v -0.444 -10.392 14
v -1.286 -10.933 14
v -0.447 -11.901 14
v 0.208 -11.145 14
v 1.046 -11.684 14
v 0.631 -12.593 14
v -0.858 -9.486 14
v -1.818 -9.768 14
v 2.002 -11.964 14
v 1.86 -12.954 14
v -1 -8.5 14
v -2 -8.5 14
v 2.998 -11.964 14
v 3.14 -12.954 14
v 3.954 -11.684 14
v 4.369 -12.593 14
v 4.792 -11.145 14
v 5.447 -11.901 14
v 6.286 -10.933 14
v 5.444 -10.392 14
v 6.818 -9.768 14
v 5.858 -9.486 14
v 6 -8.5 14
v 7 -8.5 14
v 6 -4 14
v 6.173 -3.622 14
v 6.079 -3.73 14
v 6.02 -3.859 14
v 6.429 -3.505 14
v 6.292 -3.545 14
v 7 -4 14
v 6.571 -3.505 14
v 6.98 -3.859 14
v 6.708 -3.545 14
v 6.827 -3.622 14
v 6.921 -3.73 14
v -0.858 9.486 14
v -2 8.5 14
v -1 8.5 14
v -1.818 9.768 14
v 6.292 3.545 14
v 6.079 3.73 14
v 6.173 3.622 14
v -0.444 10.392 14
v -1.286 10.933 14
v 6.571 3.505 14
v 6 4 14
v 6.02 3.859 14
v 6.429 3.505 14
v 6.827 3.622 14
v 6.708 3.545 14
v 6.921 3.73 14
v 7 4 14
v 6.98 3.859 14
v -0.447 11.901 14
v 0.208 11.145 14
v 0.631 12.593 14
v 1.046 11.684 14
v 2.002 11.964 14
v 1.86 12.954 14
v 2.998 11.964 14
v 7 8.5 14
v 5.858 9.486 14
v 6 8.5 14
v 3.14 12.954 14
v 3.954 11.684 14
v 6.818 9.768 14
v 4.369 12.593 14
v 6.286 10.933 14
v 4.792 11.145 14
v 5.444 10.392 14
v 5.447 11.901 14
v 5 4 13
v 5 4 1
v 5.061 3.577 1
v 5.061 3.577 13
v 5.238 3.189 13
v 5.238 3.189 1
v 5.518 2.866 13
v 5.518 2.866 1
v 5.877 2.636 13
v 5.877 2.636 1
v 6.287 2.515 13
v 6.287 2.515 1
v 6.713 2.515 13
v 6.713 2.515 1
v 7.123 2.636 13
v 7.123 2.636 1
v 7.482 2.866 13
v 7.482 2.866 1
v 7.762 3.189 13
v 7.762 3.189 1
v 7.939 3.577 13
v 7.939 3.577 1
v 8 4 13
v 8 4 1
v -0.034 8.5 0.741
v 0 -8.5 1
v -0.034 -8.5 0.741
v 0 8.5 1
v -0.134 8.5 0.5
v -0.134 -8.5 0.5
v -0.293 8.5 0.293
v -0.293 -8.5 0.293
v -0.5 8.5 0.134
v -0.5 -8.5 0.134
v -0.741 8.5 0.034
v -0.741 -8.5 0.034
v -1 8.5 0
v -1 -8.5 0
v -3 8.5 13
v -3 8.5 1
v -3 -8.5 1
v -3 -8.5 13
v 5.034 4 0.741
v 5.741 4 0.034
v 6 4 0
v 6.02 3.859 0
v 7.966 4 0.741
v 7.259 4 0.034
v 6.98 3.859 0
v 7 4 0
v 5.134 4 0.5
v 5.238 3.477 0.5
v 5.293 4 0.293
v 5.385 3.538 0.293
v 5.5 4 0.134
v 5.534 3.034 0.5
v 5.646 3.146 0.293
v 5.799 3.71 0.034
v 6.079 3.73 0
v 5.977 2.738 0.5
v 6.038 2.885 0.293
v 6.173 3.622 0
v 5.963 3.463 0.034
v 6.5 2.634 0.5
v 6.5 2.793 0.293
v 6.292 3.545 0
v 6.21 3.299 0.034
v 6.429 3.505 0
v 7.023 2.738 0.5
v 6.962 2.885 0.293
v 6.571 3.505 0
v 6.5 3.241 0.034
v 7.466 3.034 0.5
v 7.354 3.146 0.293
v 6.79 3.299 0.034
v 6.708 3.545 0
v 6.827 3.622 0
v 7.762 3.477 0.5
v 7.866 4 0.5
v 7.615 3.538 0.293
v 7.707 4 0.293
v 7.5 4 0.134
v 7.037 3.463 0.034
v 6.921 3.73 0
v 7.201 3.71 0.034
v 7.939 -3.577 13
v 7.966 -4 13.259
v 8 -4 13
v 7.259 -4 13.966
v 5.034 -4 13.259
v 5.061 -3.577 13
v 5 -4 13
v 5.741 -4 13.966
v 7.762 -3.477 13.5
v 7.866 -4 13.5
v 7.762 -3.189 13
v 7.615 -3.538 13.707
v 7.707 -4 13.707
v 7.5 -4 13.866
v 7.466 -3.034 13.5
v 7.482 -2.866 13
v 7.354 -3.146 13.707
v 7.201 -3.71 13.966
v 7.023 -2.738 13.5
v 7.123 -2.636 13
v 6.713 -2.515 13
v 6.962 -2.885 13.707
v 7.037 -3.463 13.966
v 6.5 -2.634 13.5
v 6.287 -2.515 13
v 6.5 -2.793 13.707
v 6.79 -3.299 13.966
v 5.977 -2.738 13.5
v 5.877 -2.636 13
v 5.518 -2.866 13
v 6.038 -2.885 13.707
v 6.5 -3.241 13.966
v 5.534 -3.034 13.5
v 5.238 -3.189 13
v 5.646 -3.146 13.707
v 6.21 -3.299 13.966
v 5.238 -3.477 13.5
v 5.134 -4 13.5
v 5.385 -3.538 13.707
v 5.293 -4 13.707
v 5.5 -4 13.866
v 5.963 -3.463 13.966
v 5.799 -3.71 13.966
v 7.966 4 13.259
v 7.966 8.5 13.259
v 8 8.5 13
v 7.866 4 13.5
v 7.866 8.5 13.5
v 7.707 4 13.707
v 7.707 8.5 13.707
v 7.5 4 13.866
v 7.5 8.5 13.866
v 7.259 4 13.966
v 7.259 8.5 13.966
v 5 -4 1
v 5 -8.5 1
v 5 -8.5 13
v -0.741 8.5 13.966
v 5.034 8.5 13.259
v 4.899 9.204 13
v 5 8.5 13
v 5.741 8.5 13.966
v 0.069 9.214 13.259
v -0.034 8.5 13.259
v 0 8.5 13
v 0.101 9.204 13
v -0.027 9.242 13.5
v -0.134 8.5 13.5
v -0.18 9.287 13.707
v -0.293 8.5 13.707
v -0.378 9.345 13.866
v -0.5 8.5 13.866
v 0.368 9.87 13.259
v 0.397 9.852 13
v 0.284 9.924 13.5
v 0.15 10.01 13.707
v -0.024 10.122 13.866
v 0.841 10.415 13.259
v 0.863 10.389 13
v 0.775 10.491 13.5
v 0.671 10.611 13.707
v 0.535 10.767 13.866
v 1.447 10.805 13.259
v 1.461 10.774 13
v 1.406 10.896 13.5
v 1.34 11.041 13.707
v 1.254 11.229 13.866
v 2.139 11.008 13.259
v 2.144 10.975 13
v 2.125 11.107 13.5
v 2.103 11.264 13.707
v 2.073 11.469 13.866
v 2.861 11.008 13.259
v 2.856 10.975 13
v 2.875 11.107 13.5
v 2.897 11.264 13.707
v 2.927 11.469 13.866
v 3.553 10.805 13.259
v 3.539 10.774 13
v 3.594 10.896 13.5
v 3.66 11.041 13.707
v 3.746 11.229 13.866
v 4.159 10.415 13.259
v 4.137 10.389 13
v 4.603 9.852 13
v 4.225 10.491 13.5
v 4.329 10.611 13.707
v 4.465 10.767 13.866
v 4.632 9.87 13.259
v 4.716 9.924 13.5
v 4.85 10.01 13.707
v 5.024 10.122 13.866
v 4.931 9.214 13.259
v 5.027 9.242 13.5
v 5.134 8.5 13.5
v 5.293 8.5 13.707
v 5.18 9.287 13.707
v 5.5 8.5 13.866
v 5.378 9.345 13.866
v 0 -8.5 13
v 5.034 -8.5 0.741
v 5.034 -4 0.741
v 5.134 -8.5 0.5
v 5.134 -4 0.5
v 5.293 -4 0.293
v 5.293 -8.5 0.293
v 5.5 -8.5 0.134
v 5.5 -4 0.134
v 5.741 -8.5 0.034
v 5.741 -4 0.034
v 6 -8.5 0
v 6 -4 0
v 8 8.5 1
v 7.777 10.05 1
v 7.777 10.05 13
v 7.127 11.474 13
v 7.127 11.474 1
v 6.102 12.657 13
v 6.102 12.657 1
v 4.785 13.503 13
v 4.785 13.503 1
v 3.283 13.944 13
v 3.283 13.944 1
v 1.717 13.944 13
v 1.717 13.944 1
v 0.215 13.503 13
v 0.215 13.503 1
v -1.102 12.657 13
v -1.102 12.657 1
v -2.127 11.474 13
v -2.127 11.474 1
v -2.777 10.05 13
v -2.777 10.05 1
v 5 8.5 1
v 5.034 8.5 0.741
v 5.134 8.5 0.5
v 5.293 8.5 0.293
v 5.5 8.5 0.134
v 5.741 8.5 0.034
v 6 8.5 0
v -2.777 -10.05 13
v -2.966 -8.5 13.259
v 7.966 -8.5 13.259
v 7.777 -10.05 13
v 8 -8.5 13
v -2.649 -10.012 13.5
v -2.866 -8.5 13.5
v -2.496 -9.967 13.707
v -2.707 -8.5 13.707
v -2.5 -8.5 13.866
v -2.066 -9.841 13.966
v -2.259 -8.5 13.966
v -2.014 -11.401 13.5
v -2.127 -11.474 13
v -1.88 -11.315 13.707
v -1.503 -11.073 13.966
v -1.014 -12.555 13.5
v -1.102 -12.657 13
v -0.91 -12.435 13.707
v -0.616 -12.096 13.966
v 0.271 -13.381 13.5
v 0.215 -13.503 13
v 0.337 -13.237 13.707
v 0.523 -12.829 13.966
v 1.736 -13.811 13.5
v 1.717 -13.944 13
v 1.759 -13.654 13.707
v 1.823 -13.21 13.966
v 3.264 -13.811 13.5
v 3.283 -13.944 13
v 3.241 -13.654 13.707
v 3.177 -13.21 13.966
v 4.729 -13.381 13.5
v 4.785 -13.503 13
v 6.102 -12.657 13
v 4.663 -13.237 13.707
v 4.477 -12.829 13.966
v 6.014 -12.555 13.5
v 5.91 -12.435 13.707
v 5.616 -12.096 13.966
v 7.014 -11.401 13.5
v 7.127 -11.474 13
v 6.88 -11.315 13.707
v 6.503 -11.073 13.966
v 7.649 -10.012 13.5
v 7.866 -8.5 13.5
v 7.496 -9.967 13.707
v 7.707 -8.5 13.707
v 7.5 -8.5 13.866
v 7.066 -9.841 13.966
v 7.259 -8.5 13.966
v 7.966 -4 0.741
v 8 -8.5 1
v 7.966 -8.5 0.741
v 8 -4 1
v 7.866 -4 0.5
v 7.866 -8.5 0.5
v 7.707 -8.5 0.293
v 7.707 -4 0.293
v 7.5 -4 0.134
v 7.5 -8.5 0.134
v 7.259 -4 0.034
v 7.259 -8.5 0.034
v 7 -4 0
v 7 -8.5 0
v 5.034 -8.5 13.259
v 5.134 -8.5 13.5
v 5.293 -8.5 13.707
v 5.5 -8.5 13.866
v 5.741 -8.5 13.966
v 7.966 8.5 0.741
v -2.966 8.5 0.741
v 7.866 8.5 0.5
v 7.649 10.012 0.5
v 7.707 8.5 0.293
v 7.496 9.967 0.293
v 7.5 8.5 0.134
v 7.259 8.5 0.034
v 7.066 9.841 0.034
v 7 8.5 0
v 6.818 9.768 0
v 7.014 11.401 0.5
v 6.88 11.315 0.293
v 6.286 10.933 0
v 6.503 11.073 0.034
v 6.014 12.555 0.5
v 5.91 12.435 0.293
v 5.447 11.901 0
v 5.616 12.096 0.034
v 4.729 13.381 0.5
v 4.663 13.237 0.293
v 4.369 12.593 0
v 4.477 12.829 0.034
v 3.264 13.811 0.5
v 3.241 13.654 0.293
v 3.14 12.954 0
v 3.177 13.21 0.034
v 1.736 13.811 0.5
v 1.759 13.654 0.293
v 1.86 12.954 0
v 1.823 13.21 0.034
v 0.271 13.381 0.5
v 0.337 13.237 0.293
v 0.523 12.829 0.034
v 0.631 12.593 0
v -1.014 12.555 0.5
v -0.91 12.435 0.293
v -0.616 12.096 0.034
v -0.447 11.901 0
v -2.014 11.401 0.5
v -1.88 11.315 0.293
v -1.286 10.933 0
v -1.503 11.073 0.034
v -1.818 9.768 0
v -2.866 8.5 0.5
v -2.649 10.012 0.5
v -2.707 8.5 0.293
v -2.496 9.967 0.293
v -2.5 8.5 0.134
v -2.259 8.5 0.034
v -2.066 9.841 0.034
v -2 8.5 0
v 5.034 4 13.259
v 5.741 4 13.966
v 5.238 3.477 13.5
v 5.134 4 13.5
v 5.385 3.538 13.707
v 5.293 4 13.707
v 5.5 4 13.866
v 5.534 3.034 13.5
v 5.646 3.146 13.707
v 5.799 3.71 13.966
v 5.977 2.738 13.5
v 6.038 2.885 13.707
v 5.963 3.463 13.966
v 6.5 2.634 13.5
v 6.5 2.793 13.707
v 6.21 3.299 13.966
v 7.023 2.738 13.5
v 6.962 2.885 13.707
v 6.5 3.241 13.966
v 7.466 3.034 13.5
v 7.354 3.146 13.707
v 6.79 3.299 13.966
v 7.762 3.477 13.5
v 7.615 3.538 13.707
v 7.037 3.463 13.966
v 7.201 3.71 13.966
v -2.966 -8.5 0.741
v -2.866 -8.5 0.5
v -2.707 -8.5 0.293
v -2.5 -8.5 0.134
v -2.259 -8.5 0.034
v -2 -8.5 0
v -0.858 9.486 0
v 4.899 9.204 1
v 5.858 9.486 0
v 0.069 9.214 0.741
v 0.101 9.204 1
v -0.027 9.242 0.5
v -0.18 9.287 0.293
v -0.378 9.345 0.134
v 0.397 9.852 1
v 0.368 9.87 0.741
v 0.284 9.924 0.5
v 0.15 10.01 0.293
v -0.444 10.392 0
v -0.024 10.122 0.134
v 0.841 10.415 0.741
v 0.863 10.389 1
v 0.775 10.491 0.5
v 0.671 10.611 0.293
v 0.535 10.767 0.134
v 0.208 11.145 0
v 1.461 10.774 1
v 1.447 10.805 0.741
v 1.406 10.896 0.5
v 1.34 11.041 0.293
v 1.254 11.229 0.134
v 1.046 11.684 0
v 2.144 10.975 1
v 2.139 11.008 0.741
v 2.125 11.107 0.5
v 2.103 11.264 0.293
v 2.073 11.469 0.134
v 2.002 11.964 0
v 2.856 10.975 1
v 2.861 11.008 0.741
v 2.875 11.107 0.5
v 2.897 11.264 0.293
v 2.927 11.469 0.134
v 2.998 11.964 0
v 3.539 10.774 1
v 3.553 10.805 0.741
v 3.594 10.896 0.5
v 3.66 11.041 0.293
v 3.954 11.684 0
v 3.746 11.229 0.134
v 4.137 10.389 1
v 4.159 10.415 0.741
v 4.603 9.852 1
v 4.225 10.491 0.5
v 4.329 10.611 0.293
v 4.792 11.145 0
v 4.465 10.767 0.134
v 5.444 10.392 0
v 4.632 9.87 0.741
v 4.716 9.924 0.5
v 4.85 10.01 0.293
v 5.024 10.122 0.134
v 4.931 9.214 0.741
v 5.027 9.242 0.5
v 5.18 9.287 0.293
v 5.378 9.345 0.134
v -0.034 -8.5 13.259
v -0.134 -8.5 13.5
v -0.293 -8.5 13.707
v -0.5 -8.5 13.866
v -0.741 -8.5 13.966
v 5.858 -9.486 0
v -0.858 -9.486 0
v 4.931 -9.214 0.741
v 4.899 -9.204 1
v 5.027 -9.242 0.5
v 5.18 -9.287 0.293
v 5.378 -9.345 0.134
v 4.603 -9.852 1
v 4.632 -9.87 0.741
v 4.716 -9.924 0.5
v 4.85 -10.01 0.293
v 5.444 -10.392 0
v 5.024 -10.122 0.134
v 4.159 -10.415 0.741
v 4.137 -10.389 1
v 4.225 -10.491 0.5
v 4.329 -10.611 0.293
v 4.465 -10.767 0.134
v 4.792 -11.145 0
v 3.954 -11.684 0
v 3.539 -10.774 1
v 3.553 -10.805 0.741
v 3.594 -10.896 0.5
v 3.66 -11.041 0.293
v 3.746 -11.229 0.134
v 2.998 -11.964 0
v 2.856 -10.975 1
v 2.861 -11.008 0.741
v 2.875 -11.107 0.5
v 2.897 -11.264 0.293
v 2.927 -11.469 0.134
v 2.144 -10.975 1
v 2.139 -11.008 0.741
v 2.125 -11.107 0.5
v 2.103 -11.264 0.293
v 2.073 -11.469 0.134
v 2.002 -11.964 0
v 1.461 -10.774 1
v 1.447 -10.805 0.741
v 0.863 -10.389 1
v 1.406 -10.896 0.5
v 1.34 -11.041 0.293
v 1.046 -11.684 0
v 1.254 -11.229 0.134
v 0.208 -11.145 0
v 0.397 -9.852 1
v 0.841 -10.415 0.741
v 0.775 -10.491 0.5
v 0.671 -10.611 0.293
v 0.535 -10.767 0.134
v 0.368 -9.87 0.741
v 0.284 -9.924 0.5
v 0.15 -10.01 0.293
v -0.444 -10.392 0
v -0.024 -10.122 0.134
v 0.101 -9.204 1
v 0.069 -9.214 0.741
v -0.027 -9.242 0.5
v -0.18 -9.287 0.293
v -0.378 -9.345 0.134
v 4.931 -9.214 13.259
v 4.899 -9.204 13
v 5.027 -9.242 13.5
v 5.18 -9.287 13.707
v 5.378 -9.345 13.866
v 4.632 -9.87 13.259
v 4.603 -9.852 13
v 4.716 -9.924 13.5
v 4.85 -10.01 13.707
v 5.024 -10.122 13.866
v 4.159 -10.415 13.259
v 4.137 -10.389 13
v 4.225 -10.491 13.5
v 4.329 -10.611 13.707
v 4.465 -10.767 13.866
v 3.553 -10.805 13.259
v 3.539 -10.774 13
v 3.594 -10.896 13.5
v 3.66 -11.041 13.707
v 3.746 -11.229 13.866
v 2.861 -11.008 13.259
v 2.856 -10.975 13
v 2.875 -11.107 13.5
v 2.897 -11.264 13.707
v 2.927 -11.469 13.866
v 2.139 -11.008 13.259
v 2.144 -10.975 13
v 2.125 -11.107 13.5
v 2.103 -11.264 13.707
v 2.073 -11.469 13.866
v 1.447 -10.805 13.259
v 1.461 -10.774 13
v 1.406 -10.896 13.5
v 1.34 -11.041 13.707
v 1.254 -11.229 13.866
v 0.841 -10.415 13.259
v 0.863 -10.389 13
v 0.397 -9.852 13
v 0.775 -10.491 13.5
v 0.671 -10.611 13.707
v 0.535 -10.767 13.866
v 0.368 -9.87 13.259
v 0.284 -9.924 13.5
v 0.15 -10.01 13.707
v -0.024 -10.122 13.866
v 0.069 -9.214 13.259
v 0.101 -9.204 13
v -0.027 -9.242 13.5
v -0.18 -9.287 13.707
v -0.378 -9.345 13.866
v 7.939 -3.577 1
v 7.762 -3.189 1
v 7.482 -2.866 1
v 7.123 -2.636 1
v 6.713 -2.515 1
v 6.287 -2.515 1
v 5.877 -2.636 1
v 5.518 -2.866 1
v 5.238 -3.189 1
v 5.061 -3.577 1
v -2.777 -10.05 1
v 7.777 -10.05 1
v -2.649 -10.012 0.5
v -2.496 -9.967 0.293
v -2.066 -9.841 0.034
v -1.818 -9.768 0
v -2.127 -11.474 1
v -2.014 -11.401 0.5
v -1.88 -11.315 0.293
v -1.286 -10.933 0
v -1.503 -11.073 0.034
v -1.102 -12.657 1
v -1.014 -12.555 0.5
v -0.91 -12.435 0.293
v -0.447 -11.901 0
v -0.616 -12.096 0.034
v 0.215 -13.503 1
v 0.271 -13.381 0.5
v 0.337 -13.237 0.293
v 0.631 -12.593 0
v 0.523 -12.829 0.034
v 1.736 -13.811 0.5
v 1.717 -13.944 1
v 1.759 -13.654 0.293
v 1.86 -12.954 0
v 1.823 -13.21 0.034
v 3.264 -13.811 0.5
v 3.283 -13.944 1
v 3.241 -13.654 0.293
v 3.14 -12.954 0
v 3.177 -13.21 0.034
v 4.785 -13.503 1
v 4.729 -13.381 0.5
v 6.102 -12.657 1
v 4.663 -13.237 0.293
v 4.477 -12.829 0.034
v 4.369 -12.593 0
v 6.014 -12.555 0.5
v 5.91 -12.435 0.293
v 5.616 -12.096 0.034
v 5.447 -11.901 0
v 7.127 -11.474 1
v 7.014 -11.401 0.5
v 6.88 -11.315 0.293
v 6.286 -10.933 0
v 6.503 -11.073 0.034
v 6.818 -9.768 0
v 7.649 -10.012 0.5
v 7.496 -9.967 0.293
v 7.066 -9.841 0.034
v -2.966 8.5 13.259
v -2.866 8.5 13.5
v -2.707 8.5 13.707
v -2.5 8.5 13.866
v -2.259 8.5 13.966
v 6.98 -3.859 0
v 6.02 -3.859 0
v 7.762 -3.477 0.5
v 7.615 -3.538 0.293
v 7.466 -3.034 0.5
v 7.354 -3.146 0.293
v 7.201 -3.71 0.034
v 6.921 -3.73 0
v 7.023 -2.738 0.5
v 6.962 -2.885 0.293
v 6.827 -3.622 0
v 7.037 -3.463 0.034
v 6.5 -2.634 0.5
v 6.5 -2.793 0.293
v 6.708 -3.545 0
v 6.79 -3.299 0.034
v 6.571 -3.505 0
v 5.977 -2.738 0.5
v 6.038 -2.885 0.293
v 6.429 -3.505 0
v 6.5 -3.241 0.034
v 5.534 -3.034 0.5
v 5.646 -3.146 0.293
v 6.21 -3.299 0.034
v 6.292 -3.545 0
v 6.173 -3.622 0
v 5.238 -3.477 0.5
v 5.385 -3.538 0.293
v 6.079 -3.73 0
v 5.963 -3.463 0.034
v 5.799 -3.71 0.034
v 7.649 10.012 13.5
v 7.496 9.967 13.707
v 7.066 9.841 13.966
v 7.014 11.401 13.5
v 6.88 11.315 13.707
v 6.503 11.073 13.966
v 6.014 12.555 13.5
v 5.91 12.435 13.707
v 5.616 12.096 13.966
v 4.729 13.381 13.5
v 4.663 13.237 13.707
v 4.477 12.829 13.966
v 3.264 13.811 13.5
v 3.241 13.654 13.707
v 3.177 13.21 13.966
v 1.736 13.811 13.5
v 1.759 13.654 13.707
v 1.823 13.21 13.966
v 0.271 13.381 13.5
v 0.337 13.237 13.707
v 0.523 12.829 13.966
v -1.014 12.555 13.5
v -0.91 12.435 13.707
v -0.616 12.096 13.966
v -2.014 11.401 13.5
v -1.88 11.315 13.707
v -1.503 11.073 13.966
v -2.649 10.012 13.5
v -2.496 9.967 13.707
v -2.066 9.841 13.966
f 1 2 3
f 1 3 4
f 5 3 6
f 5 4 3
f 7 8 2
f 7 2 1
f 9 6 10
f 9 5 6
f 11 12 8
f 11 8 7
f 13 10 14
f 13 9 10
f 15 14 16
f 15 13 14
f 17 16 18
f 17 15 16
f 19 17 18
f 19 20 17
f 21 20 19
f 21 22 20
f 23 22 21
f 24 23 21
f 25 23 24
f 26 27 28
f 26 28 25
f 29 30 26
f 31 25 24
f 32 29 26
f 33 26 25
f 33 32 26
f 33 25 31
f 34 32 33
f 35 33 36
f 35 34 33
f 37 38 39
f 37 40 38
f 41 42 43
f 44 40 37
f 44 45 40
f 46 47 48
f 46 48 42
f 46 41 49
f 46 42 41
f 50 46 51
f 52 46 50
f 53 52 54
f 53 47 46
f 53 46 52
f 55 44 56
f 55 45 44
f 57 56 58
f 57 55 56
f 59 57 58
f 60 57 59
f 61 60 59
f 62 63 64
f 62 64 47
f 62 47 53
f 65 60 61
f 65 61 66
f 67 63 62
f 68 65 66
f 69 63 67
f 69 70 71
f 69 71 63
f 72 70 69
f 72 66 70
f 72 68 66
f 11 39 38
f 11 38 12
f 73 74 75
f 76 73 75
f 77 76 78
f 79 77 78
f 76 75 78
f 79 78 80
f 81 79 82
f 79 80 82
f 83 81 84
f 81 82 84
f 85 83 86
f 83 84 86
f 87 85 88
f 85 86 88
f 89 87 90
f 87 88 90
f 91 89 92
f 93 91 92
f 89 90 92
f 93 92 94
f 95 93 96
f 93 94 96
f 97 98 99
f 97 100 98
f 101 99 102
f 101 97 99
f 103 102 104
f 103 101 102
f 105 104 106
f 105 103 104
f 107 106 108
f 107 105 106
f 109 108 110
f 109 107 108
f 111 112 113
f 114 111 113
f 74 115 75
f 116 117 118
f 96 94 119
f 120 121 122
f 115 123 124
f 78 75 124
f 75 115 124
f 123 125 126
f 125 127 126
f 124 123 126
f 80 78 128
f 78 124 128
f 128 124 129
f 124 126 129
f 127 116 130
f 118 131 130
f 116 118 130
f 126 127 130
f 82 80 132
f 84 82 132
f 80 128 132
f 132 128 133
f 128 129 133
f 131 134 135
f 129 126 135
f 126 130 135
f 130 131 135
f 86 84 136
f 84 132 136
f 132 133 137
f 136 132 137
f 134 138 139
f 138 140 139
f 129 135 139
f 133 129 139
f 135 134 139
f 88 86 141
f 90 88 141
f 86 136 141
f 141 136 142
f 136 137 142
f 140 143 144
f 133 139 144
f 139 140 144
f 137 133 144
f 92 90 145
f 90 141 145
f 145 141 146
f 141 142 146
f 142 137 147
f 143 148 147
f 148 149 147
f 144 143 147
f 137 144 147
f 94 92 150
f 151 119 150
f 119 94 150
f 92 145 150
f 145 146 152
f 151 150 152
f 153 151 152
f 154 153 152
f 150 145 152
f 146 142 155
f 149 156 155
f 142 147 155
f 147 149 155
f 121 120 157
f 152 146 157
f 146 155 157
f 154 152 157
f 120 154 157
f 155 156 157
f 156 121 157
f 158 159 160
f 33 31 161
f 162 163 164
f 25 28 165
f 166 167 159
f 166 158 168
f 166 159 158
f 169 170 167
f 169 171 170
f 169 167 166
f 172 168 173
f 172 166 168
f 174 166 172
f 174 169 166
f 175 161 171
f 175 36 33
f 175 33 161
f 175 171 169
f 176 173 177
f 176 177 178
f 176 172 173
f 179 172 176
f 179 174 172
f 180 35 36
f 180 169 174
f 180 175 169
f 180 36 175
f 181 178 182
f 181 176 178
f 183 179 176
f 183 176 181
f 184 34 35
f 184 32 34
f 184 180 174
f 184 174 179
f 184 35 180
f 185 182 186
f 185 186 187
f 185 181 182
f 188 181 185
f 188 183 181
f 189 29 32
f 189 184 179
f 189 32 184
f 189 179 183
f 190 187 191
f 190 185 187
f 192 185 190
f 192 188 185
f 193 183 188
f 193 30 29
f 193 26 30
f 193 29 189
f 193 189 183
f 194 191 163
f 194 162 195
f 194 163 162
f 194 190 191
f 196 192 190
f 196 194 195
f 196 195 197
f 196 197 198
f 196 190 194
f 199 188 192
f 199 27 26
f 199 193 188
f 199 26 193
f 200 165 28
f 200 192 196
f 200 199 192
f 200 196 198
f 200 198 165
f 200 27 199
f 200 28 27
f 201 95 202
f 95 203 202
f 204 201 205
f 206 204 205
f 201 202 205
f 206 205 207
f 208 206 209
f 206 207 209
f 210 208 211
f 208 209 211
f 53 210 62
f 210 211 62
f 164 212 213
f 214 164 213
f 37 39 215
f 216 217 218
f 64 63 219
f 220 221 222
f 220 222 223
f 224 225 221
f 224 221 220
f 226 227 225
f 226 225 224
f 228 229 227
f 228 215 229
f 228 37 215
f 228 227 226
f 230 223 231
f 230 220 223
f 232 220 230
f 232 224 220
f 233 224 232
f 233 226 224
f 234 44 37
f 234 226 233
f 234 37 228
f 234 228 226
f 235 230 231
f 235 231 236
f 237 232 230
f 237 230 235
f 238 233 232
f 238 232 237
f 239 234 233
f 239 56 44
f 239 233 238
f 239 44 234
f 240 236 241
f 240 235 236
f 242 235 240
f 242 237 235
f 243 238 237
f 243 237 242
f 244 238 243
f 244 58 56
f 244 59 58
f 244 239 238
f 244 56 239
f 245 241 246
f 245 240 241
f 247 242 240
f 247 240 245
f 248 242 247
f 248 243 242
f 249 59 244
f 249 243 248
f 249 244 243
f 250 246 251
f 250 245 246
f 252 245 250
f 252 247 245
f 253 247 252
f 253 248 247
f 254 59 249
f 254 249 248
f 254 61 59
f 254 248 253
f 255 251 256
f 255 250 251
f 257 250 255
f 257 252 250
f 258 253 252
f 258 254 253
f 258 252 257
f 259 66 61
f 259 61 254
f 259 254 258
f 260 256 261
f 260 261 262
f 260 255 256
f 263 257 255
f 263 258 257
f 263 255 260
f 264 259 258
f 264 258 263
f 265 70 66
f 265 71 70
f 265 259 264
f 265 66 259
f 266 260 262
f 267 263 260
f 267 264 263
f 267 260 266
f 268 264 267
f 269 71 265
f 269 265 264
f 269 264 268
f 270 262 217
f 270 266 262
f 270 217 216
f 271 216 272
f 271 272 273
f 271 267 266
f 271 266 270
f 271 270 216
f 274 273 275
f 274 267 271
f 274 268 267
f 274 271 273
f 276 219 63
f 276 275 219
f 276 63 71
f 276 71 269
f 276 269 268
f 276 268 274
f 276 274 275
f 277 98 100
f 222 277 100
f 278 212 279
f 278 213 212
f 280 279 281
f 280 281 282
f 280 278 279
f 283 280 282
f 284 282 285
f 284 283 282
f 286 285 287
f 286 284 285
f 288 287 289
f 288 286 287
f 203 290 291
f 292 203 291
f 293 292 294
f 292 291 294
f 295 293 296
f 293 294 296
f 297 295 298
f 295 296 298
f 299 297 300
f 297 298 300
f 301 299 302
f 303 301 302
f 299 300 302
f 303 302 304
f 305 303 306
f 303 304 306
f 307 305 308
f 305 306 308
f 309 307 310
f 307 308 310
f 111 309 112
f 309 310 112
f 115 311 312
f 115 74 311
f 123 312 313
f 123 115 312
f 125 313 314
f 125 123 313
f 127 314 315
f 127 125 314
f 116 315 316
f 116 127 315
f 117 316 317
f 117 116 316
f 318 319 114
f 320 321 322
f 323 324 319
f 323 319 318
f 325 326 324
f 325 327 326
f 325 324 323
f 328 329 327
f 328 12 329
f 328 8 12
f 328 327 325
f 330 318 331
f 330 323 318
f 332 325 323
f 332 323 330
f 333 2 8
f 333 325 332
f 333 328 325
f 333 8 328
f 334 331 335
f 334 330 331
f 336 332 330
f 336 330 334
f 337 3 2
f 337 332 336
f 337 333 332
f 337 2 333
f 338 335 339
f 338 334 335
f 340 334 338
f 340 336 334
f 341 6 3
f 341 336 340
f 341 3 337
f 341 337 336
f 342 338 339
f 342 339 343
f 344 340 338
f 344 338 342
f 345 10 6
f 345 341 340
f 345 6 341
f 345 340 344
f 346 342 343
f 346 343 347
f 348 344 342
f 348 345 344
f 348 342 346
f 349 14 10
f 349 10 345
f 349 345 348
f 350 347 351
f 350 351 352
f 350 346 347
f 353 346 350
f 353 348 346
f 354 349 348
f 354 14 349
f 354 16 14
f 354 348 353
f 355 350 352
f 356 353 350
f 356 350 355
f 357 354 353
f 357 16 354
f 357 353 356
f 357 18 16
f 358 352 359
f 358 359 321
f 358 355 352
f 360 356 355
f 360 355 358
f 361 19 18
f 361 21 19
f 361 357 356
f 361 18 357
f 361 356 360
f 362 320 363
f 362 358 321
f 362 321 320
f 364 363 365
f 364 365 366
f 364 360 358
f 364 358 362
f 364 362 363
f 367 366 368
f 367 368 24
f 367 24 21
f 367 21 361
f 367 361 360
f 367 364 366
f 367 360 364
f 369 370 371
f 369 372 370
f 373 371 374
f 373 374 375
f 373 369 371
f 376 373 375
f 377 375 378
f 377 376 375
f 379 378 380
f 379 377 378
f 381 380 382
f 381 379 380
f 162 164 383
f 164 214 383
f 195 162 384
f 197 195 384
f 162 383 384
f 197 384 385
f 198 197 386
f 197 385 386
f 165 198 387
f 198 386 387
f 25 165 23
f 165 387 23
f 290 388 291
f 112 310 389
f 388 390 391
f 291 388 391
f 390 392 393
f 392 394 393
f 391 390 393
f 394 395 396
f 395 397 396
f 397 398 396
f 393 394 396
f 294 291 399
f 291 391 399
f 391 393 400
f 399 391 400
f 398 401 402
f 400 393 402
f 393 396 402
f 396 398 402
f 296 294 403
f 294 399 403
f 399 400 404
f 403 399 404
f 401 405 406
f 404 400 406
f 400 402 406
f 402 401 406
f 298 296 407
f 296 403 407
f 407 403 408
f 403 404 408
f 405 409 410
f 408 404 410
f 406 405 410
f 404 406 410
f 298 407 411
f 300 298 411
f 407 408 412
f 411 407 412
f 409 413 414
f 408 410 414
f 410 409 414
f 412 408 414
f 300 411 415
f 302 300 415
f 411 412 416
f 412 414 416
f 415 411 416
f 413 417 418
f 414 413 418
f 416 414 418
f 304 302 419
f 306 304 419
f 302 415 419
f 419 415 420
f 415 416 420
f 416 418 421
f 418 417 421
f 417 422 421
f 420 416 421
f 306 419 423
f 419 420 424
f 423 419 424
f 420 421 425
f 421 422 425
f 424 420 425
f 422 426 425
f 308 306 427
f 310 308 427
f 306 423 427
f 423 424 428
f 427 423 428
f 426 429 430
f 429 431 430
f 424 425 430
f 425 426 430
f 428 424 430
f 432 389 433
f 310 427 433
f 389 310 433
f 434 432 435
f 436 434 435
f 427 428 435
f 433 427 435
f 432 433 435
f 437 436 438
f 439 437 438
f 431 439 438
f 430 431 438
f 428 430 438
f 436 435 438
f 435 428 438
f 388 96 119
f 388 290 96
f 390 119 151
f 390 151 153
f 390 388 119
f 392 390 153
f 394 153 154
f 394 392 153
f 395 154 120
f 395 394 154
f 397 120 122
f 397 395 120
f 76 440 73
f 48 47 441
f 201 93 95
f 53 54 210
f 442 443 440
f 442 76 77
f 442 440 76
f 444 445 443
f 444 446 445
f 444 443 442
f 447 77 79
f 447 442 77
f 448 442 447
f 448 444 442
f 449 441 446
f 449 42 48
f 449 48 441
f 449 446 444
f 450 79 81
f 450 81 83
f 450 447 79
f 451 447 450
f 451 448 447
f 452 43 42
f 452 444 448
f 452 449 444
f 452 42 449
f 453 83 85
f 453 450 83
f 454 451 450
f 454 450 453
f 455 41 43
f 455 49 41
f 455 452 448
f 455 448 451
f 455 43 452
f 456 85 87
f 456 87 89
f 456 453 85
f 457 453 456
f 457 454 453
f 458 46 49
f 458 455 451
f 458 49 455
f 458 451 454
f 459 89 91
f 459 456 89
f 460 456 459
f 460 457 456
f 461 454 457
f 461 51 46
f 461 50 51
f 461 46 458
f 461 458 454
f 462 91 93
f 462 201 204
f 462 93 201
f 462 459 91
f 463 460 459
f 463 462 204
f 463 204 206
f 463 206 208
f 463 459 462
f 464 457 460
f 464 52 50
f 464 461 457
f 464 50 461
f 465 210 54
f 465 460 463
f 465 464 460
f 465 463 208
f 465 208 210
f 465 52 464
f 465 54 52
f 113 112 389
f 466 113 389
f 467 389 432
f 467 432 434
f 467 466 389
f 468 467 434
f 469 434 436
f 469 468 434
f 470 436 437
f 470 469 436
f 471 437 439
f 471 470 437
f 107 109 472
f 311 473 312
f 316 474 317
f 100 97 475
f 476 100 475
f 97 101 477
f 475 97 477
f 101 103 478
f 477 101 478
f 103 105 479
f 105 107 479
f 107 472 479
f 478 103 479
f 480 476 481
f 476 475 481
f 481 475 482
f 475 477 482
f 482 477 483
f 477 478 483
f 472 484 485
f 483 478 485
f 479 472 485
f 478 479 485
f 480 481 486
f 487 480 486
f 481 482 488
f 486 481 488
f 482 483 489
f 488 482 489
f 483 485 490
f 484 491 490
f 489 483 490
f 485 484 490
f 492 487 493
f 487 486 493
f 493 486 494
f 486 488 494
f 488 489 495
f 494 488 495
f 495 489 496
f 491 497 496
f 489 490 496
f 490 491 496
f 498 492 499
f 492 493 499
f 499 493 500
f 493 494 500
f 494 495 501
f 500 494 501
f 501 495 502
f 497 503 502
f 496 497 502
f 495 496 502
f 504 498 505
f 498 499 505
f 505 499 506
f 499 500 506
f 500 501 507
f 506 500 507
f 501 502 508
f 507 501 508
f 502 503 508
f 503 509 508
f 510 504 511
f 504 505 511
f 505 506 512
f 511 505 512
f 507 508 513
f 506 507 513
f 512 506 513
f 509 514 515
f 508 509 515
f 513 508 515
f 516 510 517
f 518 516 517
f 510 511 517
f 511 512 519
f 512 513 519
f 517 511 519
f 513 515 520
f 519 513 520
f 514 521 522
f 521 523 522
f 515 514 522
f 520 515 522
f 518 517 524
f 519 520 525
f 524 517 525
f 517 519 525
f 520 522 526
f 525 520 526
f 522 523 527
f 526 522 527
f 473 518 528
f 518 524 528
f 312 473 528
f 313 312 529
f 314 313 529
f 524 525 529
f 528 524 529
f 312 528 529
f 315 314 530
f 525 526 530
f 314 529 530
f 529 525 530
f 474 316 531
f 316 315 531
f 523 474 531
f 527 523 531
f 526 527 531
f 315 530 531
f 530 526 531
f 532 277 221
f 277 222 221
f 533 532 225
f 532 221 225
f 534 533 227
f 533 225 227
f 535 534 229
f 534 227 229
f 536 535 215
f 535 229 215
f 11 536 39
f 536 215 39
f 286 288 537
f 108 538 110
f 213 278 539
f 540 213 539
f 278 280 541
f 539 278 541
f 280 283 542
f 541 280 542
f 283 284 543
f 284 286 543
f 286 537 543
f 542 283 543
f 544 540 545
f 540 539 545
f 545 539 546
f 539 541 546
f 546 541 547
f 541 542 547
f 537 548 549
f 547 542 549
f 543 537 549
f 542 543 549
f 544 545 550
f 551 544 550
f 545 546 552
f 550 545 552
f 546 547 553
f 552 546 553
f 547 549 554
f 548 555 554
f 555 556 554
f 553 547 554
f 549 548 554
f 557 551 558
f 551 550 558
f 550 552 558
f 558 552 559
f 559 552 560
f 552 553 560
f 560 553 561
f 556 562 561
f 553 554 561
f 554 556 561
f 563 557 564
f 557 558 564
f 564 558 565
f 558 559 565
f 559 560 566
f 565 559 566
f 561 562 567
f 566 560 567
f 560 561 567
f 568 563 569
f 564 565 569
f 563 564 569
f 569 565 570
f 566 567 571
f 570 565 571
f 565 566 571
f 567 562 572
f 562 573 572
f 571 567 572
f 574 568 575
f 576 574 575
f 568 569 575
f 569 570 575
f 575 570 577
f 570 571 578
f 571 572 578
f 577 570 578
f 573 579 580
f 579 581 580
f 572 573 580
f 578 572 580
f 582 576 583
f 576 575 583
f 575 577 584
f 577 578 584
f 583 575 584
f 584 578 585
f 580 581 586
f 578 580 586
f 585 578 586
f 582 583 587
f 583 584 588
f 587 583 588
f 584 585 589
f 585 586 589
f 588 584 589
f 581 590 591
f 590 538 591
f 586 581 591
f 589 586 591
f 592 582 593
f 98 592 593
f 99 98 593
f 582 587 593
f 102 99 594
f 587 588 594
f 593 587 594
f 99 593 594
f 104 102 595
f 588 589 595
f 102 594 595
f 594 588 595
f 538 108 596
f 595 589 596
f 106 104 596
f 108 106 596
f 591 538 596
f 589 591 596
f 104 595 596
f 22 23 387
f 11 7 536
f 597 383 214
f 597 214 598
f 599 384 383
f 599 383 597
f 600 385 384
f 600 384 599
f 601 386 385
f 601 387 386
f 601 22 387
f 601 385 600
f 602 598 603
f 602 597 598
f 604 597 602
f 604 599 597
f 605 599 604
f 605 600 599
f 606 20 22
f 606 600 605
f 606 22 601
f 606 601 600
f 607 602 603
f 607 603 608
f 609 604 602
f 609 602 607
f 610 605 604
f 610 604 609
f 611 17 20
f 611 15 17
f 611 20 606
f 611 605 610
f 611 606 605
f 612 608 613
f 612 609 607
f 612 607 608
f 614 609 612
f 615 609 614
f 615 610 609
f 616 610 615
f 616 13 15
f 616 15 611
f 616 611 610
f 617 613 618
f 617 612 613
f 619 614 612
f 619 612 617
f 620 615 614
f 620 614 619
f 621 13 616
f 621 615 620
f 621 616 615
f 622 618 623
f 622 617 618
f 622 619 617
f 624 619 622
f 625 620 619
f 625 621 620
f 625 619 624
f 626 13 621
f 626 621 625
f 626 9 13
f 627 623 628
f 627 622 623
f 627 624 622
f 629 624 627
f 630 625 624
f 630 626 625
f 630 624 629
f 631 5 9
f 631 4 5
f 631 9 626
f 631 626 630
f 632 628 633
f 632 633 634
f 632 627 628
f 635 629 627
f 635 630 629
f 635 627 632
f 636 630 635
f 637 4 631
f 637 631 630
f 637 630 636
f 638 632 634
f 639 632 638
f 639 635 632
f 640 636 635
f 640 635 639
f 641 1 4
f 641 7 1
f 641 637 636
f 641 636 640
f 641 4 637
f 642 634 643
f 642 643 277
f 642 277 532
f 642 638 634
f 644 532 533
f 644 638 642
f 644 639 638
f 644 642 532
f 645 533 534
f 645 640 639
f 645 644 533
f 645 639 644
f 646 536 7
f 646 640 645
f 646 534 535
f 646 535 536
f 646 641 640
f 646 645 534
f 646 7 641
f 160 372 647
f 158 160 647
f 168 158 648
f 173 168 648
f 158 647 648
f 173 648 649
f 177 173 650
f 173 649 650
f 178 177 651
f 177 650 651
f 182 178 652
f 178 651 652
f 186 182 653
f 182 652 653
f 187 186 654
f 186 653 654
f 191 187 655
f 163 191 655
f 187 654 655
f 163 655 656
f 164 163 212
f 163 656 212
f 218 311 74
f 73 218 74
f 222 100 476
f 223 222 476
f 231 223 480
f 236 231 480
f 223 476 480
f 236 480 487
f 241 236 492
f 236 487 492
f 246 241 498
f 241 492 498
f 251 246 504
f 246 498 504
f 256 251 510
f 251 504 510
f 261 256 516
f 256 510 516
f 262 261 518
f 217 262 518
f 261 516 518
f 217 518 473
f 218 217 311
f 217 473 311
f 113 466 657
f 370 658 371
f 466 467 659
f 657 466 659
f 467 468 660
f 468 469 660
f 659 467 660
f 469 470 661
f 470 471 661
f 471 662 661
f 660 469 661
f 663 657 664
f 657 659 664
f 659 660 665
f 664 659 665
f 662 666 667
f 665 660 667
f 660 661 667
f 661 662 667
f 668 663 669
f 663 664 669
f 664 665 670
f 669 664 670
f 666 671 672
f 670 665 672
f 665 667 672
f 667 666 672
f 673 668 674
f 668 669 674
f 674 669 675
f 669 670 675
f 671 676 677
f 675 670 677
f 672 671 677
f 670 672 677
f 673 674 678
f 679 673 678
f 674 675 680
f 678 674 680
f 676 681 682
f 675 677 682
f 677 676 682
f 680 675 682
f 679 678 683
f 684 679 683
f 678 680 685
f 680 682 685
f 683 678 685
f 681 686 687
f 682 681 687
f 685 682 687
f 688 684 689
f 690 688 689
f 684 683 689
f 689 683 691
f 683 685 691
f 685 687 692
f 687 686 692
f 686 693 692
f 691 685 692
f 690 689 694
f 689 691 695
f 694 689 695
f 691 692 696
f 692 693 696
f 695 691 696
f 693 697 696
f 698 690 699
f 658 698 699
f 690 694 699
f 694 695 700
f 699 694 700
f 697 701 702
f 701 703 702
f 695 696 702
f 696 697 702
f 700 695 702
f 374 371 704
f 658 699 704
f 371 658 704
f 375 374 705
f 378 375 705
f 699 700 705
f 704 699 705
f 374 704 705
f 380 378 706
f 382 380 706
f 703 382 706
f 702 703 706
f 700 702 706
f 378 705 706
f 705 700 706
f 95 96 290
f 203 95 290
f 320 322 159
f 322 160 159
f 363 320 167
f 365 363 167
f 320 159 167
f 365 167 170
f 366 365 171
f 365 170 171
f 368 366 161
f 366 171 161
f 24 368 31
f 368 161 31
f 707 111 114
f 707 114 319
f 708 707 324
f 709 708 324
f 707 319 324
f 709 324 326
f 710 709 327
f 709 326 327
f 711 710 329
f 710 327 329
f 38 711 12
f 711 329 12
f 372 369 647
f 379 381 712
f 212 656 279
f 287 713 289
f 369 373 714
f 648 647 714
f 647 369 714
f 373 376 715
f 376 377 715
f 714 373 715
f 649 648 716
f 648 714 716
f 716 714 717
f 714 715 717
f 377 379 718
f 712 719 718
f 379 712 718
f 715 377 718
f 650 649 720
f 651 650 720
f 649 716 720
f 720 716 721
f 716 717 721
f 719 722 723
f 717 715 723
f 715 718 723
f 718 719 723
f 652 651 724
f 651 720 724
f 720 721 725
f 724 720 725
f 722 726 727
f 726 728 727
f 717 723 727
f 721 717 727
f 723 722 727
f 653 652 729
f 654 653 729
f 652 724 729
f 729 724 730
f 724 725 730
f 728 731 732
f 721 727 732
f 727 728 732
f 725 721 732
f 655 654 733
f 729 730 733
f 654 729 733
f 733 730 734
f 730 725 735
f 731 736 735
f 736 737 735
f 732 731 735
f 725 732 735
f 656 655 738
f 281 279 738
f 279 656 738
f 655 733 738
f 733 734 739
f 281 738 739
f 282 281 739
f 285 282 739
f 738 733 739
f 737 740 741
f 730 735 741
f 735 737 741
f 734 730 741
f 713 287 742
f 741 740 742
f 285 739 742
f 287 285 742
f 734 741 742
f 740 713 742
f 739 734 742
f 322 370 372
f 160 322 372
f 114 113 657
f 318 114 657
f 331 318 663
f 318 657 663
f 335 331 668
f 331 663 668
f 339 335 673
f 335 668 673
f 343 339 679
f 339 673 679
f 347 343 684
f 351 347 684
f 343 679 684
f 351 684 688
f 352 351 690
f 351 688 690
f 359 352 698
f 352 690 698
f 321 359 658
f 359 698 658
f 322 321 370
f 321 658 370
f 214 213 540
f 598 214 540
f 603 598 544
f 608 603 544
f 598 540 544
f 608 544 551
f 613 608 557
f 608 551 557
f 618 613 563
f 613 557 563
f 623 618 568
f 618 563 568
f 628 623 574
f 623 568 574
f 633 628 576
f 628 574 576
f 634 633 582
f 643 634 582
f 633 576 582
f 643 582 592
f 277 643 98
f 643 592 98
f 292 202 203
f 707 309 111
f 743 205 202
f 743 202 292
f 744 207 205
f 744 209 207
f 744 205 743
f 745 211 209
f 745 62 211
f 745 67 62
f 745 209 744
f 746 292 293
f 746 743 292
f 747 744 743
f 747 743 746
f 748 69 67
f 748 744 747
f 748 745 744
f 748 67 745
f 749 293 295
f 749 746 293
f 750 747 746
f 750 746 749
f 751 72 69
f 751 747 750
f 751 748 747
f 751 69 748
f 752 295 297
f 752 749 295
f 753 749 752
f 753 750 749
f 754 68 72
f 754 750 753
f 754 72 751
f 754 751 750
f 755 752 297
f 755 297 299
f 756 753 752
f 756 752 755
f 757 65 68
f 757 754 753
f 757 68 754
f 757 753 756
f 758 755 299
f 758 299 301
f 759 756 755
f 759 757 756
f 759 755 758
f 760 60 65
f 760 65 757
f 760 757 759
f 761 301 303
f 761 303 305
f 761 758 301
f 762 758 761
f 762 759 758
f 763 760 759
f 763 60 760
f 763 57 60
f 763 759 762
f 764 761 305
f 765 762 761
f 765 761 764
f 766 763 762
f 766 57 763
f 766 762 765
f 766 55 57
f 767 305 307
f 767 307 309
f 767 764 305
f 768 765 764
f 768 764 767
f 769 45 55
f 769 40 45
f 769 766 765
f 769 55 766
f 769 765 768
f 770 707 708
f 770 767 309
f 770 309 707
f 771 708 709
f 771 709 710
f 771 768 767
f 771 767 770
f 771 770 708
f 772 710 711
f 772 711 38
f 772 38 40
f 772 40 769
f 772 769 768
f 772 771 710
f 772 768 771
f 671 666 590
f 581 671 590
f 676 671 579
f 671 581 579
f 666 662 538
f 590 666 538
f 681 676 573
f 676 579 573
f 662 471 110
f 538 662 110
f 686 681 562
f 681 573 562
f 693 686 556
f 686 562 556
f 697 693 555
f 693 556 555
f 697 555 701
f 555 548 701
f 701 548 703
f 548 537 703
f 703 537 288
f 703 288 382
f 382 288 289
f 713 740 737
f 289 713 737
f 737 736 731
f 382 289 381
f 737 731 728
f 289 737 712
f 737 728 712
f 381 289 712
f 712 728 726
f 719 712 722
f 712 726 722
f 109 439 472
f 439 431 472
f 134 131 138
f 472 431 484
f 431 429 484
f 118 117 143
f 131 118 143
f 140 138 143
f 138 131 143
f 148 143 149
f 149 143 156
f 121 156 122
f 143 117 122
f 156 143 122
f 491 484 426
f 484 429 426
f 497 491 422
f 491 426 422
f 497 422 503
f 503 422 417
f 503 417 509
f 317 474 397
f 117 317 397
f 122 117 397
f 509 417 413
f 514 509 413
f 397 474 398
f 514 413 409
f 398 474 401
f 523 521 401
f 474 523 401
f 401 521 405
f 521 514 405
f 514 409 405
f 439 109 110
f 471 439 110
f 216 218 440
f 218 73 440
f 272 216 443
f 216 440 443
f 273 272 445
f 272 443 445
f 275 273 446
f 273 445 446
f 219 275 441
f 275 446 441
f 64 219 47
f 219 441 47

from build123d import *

# Parameters (mm, degrees)
F1_DEPTH = 14
F2_R     = 1


with BuildPart() as f1:
    # F0 (on Top) → F1 (new body)
    with BuildSketch(Plane.XY):
        with BuildLine():
            Line((0, -8.5), (0, 0))
            Line((0, 0), (0, 8.5))
            ThreePointArc((0, 8.5), (2.5, 11), (5, 8.5))
            Line((5, 8.5), (5, 4))
            ThreePointArc((5, 4), (6.5, 2.5), (8, 4))
            Line((8, 4), (8, 8.5))
            ThreePointArc((8, 8.5), (2.5, 14), (-3, 8.5))
            Line((-3, 8.5), (-3, 0))
            Line((-3, 0), (-3, -8.5))
            ThreePointArc((-3, -8.5), (2.5, -14), (8, -8.5))
            Line((8, -8.5), (8, -4))
            ThreePointArc((8, -4), (6.5, -2.5), (5, -4))
            Line((5, -4), (5, -8.5))
            ThreePointArc((5, -8.5), (2.5, -11), (0, -8.5))
        make_face()
    extrude(amount=F1_DEPTH)

    # F2
    f2_edges = [f1.edges().sort_by_distance(p)[0] for p in [
        (2.5, -14, 14),
        (8, -6.25, 14),
        (6.5, -2.5, 14),
        (5, -6.25, 14),
        (2.5, -11, 14),
        (0, 0, 14),
        (2.5, 11, 14),
        (5, 6.25, 14),
        (6.5, 2.5, 14),
        (8, 6.25, 14),
        (2.5, 14, 14),
        (-3, 0, 14),
        (2.5, -14, 0),
        (8, -6.25, 0),
        (6.5, -2.5, 0),
        (5, -6.25, 0),
        (2.5, -11, 0),
        (0, 0, 0),
        (2.5, 11, 0),
        (5, 6.25, 0),
        (6.5, 2.5, 0),
        (8, 6.25, 0),
        (2.5, 14, 0),
        (-3, 0, 0),
    ]]
    fillet(f2_edges, radius=F2_R)


solid = f1.part
